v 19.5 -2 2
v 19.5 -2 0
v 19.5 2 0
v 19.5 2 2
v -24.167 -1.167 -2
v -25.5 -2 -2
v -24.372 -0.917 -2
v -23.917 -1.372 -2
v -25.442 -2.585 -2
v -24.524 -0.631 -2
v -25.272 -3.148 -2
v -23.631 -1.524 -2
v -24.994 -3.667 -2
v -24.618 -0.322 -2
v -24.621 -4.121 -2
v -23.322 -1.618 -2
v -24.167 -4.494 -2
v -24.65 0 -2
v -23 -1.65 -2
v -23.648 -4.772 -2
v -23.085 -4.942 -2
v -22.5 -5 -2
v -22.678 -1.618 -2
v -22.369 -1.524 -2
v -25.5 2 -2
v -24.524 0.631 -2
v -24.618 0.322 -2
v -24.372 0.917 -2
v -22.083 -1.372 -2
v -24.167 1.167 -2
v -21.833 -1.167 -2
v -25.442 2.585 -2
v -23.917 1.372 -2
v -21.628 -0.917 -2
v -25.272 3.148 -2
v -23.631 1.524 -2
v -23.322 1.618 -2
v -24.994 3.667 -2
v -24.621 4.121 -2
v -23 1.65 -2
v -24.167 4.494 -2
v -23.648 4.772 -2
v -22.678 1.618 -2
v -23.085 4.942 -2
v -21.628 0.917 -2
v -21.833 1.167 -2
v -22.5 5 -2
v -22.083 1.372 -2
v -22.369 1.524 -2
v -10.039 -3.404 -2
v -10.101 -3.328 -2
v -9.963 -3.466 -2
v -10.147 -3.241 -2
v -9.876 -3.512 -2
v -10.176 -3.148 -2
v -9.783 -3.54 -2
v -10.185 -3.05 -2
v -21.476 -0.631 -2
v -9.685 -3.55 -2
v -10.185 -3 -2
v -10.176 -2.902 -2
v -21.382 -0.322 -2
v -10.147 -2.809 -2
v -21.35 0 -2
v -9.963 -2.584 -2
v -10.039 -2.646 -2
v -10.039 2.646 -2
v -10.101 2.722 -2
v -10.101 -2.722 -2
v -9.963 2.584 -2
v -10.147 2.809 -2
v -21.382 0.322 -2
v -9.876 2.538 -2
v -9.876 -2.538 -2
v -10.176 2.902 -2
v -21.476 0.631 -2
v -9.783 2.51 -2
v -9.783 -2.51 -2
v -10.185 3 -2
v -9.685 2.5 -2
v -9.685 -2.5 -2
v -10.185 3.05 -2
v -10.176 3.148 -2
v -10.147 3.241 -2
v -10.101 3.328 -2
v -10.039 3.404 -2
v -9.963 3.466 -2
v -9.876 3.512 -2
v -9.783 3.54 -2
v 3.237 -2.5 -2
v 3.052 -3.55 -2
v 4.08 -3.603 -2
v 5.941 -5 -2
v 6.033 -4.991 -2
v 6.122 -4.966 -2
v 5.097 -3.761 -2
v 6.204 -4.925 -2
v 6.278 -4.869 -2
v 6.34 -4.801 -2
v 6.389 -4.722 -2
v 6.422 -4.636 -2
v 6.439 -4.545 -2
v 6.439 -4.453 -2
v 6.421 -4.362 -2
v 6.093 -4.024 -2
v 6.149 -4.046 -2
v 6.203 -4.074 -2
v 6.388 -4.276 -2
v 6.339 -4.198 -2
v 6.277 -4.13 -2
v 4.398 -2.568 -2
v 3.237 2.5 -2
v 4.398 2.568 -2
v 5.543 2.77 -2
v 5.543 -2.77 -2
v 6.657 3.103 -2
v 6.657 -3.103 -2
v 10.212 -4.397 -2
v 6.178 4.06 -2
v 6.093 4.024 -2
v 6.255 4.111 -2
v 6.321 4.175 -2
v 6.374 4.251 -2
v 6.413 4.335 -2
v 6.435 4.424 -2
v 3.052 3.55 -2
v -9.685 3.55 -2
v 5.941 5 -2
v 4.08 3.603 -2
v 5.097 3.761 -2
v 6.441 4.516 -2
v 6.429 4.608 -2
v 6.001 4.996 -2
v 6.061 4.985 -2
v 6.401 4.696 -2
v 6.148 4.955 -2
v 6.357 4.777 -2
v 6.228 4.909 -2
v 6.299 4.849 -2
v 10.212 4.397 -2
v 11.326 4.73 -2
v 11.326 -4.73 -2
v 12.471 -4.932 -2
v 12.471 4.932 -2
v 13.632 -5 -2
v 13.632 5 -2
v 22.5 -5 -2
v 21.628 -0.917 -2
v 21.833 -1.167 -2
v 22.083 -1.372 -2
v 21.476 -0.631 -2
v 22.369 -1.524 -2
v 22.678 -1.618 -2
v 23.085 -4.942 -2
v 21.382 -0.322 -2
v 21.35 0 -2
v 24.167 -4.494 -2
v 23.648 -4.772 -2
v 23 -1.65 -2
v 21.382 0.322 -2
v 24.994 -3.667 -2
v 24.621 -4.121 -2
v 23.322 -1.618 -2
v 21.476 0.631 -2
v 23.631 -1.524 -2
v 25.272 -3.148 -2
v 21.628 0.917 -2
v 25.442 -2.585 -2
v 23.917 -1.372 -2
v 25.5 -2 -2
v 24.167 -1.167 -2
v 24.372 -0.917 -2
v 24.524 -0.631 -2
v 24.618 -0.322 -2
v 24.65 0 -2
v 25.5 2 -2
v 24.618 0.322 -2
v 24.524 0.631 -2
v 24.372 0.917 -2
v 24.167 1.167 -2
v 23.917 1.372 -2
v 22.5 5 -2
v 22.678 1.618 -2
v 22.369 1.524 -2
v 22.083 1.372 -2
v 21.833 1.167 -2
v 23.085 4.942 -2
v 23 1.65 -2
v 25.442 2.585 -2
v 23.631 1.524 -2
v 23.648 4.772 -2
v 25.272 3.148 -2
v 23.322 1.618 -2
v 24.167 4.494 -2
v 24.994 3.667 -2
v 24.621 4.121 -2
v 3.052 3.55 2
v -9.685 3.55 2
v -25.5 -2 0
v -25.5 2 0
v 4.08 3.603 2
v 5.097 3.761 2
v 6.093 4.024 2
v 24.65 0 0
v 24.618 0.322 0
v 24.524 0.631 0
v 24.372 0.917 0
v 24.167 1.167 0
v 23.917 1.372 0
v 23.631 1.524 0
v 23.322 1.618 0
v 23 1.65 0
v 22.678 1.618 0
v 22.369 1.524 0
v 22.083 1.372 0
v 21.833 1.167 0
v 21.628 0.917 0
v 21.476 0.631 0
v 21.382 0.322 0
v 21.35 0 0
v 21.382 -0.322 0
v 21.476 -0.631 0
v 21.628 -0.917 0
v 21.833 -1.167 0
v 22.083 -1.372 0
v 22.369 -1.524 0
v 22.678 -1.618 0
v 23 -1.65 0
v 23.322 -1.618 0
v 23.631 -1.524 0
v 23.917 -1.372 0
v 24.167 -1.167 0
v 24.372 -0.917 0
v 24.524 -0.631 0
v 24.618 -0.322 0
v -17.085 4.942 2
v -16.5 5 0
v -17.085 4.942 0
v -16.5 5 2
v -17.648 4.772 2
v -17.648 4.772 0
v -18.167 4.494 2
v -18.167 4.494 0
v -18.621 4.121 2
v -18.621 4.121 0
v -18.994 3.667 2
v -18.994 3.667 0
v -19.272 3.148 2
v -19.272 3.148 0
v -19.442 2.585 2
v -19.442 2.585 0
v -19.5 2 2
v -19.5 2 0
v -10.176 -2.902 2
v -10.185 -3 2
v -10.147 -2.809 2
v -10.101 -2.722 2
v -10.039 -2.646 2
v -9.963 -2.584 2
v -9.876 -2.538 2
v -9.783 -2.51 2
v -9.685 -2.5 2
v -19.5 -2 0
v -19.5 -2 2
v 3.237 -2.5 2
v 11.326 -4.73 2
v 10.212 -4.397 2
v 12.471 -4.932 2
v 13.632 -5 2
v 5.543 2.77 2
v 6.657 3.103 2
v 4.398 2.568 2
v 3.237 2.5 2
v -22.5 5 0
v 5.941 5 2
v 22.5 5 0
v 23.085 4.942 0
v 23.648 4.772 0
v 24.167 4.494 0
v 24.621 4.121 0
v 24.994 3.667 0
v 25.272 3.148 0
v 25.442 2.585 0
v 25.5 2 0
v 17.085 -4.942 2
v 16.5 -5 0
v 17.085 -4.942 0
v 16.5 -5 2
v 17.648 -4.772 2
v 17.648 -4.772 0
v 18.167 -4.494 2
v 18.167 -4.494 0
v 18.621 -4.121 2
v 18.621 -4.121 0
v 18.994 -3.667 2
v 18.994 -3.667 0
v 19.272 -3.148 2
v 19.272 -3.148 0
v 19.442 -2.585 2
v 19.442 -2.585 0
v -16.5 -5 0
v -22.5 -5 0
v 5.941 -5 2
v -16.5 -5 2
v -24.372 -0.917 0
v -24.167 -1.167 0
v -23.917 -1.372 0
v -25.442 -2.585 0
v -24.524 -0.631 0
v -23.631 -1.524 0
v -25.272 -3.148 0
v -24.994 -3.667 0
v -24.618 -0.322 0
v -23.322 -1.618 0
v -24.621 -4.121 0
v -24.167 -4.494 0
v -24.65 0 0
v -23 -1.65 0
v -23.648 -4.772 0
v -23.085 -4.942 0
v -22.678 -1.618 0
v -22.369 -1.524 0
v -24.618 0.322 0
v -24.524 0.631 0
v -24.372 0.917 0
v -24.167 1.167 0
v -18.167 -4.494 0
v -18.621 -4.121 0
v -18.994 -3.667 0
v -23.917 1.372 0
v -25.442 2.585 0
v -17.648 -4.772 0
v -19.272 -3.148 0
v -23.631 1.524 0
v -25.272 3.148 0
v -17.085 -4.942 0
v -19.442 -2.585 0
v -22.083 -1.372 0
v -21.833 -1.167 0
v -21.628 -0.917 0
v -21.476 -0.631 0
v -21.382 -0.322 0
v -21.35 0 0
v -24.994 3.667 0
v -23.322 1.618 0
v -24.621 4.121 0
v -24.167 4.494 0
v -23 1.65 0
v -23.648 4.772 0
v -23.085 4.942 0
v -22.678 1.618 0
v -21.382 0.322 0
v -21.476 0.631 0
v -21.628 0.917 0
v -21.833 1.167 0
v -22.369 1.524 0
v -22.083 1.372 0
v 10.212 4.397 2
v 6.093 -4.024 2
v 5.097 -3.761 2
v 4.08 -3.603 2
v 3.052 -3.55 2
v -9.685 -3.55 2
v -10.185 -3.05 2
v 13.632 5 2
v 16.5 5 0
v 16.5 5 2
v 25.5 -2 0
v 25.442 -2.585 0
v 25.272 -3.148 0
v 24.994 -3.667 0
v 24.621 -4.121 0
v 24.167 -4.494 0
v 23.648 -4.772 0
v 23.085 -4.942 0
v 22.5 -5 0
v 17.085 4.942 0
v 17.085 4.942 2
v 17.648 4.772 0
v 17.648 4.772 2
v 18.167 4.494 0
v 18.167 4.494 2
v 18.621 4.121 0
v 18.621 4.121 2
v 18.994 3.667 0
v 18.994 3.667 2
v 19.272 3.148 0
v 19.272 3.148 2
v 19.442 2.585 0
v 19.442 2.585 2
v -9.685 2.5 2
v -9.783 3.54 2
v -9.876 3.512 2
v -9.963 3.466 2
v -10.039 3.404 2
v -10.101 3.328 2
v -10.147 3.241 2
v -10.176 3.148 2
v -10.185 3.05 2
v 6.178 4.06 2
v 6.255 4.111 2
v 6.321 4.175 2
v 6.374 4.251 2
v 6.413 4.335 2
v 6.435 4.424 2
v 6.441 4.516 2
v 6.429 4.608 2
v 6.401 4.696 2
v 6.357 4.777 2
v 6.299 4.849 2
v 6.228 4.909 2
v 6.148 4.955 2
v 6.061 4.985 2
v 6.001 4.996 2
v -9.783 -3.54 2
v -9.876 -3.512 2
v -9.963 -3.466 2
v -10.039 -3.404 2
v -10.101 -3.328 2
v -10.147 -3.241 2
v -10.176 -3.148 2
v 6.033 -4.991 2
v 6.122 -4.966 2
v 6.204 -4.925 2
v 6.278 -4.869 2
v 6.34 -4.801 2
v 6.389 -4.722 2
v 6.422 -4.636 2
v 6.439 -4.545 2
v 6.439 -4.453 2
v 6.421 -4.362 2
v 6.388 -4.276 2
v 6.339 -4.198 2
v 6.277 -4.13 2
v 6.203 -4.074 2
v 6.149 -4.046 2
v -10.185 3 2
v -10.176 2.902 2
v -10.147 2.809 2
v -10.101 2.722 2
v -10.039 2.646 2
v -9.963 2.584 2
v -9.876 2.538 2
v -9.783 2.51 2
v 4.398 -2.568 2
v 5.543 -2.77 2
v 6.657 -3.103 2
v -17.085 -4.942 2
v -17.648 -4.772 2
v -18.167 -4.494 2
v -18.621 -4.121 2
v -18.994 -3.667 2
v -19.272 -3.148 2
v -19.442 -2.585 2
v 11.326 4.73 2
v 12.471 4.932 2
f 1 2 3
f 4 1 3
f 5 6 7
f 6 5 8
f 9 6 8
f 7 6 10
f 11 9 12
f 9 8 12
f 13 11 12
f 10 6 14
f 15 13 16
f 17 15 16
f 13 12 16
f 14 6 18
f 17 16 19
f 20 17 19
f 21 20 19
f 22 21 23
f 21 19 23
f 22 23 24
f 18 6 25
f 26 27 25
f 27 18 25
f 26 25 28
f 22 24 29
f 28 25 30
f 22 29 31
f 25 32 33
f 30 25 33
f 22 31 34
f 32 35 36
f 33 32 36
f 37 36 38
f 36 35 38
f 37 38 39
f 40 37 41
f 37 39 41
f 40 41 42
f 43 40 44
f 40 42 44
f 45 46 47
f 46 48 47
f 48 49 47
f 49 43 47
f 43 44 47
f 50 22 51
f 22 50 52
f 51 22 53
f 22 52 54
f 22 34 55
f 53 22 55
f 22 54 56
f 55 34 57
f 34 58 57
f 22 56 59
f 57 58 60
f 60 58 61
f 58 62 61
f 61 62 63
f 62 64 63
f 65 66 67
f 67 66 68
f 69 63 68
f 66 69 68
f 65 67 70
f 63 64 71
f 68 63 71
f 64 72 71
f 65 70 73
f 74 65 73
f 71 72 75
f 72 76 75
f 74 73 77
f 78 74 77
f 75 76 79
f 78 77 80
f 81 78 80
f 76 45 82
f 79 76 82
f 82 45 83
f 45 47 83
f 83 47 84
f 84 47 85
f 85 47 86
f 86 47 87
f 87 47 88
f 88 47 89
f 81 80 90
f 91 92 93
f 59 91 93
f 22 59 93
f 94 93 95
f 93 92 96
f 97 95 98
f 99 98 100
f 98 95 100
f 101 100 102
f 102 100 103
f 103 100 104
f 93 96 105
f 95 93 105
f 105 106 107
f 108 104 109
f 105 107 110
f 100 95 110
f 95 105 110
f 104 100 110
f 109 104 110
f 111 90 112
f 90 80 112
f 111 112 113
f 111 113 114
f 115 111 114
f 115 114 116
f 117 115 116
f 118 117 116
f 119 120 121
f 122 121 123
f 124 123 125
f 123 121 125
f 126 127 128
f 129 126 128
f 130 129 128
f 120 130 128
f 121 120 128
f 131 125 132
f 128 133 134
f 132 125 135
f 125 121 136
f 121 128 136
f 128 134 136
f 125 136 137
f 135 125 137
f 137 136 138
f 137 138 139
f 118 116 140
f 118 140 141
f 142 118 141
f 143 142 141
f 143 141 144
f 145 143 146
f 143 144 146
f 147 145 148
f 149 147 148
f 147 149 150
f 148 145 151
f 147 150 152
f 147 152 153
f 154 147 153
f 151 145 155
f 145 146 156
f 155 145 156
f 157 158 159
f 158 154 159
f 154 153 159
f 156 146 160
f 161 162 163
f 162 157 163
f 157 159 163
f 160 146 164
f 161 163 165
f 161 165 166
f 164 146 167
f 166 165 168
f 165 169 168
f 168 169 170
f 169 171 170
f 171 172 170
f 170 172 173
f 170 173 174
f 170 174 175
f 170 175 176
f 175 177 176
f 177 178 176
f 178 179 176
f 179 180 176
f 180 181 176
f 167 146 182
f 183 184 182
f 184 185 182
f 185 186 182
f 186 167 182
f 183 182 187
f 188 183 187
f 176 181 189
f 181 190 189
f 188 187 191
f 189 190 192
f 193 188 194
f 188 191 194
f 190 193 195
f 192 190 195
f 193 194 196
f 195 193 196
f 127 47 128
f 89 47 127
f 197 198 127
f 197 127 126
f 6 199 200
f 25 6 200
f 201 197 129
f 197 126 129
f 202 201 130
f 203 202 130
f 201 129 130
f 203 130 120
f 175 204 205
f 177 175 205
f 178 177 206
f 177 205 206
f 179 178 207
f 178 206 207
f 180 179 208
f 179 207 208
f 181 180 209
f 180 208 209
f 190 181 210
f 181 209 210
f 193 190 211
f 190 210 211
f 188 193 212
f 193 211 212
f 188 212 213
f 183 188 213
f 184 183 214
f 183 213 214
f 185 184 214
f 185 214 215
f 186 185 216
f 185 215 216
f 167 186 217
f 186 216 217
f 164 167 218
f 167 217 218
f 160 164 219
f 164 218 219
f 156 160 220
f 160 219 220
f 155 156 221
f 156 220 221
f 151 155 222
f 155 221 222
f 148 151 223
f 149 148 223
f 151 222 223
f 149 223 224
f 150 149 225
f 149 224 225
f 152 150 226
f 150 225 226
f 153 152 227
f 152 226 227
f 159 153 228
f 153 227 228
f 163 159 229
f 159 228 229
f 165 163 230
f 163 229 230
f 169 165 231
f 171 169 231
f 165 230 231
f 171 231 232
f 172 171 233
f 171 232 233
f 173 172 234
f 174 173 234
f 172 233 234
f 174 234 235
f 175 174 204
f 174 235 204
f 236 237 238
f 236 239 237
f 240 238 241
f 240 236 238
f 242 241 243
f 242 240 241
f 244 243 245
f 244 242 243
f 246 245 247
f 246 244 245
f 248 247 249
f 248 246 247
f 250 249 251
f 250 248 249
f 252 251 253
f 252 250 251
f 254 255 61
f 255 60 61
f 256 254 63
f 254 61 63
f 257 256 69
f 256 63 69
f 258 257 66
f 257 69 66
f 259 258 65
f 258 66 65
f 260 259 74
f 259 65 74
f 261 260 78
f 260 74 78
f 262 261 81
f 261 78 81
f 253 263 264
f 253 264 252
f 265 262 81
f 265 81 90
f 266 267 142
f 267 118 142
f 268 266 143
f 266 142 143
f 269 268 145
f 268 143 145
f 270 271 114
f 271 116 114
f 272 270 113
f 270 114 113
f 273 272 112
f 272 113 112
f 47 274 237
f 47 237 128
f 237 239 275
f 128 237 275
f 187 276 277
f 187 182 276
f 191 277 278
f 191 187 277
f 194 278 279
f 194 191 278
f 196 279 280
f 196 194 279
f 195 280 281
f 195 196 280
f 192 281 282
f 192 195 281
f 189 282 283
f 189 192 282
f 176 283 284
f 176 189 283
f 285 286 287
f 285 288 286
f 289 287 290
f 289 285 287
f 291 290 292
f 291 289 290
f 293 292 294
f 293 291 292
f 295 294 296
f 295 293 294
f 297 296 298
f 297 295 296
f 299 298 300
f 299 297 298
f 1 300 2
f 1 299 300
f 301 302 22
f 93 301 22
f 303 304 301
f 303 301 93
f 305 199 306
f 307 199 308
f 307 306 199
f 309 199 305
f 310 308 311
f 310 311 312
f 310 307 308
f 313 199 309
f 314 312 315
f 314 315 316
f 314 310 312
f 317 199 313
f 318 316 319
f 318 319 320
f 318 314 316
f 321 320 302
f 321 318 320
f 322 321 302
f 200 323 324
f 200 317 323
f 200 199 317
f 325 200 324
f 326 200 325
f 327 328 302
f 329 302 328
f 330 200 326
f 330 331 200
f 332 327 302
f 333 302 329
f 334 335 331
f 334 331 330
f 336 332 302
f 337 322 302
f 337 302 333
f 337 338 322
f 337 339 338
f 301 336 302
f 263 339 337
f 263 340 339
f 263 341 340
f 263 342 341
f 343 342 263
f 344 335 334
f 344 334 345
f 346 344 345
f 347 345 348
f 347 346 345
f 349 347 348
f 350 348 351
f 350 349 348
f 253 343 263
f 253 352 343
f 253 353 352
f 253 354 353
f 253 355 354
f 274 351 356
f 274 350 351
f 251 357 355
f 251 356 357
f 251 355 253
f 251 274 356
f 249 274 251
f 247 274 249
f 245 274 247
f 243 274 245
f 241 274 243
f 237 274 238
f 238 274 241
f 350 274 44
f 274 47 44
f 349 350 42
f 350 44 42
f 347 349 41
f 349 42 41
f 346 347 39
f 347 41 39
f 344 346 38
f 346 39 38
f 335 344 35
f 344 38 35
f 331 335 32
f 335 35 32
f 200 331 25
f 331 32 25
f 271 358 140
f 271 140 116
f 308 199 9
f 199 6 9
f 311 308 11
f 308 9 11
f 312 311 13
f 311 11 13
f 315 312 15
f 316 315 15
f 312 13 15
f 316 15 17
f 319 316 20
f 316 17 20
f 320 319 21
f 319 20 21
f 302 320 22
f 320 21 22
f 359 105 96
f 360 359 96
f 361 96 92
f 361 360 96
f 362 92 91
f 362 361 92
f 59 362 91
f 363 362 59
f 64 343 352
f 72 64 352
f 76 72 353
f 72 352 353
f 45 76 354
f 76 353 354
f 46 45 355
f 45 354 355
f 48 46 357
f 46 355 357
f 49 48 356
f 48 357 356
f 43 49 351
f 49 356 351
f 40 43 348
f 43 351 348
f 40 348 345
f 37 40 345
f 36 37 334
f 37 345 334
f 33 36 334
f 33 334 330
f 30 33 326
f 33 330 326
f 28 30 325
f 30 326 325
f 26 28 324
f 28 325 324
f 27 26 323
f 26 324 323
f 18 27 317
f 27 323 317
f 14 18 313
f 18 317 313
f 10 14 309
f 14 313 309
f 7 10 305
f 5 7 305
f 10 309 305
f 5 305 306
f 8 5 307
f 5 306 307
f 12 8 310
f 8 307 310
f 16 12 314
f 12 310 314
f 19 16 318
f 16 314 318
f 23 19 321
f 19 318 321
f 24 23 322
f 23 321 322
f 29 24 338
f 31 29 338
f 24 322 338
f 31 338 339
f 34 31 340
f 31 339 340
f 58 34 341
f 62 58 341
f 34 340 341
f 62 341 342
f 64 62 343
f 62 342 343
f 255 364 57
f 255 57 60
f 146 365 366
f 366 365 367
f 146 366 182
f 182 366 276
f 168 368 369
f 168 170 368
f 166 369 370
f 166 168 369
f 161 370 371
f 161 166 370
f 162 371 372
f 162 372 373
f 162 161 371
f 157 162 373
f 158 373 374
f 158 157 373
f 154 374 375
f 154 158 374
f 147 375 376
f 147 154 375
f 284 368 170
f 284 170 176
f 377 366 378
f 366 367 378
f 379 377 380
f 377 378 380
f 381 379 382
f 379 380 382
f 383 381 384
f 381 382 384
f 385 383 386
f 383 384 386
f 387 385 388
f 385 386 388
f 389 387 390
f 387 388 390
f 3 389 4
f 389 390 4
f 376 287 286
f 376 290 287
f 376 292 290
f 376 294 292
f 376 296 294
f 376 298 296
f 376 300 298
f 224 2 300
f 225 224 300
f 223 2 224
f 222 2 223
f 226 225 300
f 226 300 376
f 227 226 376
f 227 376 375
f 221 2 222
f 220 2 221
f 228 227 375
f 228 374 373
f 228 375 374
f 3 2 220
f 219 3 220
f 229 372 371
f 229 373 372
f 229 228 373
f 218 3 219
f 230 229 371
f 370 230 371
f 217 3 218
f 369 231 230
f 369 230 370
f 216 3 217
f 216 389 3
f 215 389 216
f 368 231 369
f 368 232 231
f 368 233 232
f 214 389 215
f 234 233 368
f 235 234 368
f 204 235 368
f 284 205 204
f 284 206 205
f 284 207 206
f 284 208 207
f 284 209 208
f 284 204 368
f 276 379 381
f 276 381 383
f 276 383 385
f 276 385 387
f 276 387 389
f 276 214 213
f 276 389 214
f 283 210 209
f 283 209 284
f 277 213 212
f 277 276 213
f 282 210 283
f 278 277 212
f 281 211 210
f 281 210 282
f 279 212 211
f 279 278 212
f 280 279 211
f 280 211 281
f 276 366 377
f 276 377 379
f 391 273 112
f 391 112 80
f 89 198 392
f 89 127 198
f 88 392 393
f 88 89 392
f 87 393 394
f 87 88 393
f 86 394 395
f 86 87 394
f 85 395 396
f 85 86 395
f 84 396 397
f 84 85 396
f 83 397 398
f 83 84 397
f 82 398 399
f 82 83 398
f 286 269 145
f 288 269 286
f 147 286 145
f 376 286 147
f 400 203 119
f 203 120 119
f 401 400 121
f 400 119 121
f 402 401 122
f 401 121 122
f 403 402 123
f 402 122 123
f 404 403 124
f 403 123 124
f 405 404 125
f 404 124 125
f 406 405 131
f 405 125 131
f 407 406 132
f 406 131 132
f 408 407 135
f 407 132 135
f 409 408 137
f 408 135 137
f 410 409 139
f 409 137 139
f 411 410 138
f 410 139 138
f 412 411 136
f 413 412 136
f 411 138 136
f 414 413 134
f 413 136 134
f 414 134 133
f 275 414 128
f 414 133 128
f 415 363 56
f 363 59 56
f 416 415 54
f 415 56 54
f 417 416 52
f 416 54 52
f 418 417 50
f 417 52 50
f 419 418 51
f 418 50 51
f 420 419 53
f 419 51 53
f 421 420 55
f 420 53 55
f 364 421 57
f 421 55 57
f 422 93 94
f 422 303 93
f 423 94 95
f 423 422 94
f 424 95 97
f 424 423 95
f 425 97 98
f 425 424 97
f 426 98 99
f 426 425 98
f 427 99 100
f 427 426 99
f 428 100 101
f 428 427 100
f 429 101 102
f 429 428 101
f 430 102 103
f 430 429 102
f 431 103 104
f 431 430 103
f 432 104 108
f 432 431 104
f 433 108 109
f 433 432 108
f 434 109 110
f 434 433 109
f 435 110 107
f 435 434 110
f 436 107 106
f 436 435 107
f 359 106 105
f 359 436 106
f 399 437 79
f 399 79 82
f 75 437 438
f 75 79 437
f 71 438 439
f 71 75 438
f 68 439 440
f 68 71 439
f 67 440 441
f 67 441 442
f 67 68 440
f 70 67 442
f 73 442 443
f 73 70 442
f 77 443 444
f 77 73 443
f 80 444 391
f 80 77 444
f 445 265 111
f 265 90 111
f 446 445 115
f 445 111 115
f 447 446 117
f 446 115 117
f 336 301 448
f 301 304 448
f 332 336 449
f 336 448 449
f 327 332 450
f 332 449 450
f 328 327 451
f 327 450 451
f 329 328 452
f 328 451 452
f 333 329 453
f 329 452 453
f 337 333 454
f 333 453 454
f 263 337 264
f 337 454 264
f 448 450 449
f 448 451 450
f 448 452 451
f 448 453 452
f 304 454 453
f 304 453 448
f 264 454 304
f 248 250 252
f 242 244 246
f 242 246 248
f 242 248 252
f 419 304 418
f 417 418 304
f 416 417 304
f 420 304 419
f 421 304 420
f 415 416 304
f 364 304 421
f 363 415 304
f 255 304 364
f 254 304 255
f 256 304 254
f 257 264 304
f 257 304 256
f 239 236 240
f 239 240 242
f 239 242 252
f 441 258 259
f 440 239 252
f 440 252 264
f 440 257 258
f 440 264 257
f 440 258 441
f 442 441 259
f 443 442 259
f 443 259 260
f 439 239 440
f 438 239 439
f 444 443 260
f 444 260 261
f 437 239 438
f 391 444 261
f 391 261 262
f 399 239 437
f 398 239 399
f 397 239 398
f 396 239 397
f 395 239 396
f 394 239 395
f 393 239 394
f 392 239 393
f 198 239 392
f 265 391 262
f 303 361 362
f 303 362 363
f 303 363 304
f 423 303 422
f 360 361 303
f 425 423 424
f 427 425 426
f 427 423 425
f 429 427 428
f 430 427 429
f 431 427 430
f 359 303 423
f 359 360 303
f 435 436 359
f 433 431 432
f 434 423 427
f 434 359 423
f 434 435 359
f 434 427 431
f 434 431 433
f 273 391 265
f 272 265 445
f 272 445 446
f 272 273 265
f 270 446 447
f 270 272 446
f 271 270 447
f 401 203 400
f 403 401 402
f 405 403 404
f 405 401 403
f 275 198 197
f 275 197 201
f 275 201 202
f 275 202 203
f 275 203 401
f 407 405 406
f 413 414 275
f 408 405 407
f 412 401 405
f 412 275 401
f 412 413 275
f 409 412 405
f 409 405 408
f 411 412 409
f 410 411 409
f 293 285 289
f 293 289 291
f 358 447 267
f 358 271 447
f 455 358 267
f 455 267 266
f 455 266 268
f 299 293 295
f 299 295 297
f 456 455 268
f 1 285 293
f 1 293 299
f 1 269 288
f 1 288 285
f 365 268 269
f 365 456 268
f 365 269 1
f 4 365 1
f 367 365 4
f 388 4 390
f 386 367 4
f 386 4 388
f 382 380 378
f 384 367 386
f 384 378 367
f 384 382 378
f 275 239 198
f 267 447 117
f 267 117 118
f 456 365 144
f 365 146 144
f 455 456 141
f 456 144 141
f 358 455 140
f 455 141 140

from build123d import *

# Parameters (mm, degrees)
SKETCH_W          = 51
SKETCH_H          = 10
SKETCH_R          = 1.65
PAD_DEPTH         = 2
SKETCH001_W       = 39
SKETCH001_H       = 10
PAD001_DEPTH      = 2
POCKET_DEPTH      = 2.001
POCKET_DEPTH_BACK = -2.001
FILLET_R          = 10
FILLET001_R       = 0.5
FILLET002_R       = 3


with BuildPart() as part:
    # Sketch → Pad (new body)
    with BuildSketch(Plane.XY):
        Rectangle(SKETCH_W, SKETCH_H)
        with Locations((-23, 0)):
            Circle(SKETCH_R, mode=Mode.SUBTRACT)
        with Locations((23, 0)):
            Circle(SKETCH_R, mode=Mode.SUBTRACT)
    extrude(amount=-PAD_DEPTH)

    # Sketch001 → Pad001 (join)
    with BuildSketch(Plane.XY):
        Rectangle(SKETCH001_W, SKETCH001_H)
    extrude(amount=PAD001_DEPTH)

    # Sketch002 → Pocket (cut, two sides)
    with BuildSketch(Plane.XY) as pocket_sk:
        Polygon((-10.185143, 3.55), (4.814857, 3.55), (23.608709, 10.390403), (23.793852, 9.340403), (5, 2.5), (-10.185143, 2.5), align=None)
        Polygon((-10.185143, -2.5), (5, -2.5), (23.793852, -9.340403), (23.608709, -10.390403), (4.814857, -3.55), (-10.185143, -3.55), align=None)
    extrude(amount=-POCKET_DEPTH, mode=Mode.SUBTRACT)
    extrude(pocket_sk.sketch, amount=-POCKET_DEPTH_BACK, mode=Mode.SUBTRACT)

    # Fillet
    fillet_edges = [part.edges().sort_by_distance(p)[0] for p in [
        (4.814857, -3.55, 0),
        (5, -2.5, 0),
        (5, 2.5, 0),
        (4.814857, 3.55, 0),
        (11.868694, -5, -1),
        (11.868694, 5, -1),
    ]]
    fillet(fillet_edges, radius=FILLET_R)

    # Fillet001
    fillet001_edges = [part.edges().sort_by_distance(p)[0] for p in [
        (8.798699, -5, -1),
        (8.798699, 5, -1),
        (-10.185143, -3.55, 0),
        (-10.185143, -2.5, 0),
        (-10.185143, 2.5, 0),
        (-10.185143, 3.55, 0),
    ]]
    fillet(fillet001_edges, radius=FILLET001_R)

    # Fillet002
    fillet002_edges = [part.edges().sort_by_distance(p)[0] for p in [
        (-25.5, -5, -1),
        (-25.5, 5, -1),
        (25.5, 5, -1),
        (25.5, -5, -1),
        (19.5, 5, 1),
        (19.5, -5, 1),
        (-19.5, 5, 1),
        (-19.5, -5, 1),
    ]]
    fillet(fillet002_edges, radius=FILLET002_R)


solid = part.part
